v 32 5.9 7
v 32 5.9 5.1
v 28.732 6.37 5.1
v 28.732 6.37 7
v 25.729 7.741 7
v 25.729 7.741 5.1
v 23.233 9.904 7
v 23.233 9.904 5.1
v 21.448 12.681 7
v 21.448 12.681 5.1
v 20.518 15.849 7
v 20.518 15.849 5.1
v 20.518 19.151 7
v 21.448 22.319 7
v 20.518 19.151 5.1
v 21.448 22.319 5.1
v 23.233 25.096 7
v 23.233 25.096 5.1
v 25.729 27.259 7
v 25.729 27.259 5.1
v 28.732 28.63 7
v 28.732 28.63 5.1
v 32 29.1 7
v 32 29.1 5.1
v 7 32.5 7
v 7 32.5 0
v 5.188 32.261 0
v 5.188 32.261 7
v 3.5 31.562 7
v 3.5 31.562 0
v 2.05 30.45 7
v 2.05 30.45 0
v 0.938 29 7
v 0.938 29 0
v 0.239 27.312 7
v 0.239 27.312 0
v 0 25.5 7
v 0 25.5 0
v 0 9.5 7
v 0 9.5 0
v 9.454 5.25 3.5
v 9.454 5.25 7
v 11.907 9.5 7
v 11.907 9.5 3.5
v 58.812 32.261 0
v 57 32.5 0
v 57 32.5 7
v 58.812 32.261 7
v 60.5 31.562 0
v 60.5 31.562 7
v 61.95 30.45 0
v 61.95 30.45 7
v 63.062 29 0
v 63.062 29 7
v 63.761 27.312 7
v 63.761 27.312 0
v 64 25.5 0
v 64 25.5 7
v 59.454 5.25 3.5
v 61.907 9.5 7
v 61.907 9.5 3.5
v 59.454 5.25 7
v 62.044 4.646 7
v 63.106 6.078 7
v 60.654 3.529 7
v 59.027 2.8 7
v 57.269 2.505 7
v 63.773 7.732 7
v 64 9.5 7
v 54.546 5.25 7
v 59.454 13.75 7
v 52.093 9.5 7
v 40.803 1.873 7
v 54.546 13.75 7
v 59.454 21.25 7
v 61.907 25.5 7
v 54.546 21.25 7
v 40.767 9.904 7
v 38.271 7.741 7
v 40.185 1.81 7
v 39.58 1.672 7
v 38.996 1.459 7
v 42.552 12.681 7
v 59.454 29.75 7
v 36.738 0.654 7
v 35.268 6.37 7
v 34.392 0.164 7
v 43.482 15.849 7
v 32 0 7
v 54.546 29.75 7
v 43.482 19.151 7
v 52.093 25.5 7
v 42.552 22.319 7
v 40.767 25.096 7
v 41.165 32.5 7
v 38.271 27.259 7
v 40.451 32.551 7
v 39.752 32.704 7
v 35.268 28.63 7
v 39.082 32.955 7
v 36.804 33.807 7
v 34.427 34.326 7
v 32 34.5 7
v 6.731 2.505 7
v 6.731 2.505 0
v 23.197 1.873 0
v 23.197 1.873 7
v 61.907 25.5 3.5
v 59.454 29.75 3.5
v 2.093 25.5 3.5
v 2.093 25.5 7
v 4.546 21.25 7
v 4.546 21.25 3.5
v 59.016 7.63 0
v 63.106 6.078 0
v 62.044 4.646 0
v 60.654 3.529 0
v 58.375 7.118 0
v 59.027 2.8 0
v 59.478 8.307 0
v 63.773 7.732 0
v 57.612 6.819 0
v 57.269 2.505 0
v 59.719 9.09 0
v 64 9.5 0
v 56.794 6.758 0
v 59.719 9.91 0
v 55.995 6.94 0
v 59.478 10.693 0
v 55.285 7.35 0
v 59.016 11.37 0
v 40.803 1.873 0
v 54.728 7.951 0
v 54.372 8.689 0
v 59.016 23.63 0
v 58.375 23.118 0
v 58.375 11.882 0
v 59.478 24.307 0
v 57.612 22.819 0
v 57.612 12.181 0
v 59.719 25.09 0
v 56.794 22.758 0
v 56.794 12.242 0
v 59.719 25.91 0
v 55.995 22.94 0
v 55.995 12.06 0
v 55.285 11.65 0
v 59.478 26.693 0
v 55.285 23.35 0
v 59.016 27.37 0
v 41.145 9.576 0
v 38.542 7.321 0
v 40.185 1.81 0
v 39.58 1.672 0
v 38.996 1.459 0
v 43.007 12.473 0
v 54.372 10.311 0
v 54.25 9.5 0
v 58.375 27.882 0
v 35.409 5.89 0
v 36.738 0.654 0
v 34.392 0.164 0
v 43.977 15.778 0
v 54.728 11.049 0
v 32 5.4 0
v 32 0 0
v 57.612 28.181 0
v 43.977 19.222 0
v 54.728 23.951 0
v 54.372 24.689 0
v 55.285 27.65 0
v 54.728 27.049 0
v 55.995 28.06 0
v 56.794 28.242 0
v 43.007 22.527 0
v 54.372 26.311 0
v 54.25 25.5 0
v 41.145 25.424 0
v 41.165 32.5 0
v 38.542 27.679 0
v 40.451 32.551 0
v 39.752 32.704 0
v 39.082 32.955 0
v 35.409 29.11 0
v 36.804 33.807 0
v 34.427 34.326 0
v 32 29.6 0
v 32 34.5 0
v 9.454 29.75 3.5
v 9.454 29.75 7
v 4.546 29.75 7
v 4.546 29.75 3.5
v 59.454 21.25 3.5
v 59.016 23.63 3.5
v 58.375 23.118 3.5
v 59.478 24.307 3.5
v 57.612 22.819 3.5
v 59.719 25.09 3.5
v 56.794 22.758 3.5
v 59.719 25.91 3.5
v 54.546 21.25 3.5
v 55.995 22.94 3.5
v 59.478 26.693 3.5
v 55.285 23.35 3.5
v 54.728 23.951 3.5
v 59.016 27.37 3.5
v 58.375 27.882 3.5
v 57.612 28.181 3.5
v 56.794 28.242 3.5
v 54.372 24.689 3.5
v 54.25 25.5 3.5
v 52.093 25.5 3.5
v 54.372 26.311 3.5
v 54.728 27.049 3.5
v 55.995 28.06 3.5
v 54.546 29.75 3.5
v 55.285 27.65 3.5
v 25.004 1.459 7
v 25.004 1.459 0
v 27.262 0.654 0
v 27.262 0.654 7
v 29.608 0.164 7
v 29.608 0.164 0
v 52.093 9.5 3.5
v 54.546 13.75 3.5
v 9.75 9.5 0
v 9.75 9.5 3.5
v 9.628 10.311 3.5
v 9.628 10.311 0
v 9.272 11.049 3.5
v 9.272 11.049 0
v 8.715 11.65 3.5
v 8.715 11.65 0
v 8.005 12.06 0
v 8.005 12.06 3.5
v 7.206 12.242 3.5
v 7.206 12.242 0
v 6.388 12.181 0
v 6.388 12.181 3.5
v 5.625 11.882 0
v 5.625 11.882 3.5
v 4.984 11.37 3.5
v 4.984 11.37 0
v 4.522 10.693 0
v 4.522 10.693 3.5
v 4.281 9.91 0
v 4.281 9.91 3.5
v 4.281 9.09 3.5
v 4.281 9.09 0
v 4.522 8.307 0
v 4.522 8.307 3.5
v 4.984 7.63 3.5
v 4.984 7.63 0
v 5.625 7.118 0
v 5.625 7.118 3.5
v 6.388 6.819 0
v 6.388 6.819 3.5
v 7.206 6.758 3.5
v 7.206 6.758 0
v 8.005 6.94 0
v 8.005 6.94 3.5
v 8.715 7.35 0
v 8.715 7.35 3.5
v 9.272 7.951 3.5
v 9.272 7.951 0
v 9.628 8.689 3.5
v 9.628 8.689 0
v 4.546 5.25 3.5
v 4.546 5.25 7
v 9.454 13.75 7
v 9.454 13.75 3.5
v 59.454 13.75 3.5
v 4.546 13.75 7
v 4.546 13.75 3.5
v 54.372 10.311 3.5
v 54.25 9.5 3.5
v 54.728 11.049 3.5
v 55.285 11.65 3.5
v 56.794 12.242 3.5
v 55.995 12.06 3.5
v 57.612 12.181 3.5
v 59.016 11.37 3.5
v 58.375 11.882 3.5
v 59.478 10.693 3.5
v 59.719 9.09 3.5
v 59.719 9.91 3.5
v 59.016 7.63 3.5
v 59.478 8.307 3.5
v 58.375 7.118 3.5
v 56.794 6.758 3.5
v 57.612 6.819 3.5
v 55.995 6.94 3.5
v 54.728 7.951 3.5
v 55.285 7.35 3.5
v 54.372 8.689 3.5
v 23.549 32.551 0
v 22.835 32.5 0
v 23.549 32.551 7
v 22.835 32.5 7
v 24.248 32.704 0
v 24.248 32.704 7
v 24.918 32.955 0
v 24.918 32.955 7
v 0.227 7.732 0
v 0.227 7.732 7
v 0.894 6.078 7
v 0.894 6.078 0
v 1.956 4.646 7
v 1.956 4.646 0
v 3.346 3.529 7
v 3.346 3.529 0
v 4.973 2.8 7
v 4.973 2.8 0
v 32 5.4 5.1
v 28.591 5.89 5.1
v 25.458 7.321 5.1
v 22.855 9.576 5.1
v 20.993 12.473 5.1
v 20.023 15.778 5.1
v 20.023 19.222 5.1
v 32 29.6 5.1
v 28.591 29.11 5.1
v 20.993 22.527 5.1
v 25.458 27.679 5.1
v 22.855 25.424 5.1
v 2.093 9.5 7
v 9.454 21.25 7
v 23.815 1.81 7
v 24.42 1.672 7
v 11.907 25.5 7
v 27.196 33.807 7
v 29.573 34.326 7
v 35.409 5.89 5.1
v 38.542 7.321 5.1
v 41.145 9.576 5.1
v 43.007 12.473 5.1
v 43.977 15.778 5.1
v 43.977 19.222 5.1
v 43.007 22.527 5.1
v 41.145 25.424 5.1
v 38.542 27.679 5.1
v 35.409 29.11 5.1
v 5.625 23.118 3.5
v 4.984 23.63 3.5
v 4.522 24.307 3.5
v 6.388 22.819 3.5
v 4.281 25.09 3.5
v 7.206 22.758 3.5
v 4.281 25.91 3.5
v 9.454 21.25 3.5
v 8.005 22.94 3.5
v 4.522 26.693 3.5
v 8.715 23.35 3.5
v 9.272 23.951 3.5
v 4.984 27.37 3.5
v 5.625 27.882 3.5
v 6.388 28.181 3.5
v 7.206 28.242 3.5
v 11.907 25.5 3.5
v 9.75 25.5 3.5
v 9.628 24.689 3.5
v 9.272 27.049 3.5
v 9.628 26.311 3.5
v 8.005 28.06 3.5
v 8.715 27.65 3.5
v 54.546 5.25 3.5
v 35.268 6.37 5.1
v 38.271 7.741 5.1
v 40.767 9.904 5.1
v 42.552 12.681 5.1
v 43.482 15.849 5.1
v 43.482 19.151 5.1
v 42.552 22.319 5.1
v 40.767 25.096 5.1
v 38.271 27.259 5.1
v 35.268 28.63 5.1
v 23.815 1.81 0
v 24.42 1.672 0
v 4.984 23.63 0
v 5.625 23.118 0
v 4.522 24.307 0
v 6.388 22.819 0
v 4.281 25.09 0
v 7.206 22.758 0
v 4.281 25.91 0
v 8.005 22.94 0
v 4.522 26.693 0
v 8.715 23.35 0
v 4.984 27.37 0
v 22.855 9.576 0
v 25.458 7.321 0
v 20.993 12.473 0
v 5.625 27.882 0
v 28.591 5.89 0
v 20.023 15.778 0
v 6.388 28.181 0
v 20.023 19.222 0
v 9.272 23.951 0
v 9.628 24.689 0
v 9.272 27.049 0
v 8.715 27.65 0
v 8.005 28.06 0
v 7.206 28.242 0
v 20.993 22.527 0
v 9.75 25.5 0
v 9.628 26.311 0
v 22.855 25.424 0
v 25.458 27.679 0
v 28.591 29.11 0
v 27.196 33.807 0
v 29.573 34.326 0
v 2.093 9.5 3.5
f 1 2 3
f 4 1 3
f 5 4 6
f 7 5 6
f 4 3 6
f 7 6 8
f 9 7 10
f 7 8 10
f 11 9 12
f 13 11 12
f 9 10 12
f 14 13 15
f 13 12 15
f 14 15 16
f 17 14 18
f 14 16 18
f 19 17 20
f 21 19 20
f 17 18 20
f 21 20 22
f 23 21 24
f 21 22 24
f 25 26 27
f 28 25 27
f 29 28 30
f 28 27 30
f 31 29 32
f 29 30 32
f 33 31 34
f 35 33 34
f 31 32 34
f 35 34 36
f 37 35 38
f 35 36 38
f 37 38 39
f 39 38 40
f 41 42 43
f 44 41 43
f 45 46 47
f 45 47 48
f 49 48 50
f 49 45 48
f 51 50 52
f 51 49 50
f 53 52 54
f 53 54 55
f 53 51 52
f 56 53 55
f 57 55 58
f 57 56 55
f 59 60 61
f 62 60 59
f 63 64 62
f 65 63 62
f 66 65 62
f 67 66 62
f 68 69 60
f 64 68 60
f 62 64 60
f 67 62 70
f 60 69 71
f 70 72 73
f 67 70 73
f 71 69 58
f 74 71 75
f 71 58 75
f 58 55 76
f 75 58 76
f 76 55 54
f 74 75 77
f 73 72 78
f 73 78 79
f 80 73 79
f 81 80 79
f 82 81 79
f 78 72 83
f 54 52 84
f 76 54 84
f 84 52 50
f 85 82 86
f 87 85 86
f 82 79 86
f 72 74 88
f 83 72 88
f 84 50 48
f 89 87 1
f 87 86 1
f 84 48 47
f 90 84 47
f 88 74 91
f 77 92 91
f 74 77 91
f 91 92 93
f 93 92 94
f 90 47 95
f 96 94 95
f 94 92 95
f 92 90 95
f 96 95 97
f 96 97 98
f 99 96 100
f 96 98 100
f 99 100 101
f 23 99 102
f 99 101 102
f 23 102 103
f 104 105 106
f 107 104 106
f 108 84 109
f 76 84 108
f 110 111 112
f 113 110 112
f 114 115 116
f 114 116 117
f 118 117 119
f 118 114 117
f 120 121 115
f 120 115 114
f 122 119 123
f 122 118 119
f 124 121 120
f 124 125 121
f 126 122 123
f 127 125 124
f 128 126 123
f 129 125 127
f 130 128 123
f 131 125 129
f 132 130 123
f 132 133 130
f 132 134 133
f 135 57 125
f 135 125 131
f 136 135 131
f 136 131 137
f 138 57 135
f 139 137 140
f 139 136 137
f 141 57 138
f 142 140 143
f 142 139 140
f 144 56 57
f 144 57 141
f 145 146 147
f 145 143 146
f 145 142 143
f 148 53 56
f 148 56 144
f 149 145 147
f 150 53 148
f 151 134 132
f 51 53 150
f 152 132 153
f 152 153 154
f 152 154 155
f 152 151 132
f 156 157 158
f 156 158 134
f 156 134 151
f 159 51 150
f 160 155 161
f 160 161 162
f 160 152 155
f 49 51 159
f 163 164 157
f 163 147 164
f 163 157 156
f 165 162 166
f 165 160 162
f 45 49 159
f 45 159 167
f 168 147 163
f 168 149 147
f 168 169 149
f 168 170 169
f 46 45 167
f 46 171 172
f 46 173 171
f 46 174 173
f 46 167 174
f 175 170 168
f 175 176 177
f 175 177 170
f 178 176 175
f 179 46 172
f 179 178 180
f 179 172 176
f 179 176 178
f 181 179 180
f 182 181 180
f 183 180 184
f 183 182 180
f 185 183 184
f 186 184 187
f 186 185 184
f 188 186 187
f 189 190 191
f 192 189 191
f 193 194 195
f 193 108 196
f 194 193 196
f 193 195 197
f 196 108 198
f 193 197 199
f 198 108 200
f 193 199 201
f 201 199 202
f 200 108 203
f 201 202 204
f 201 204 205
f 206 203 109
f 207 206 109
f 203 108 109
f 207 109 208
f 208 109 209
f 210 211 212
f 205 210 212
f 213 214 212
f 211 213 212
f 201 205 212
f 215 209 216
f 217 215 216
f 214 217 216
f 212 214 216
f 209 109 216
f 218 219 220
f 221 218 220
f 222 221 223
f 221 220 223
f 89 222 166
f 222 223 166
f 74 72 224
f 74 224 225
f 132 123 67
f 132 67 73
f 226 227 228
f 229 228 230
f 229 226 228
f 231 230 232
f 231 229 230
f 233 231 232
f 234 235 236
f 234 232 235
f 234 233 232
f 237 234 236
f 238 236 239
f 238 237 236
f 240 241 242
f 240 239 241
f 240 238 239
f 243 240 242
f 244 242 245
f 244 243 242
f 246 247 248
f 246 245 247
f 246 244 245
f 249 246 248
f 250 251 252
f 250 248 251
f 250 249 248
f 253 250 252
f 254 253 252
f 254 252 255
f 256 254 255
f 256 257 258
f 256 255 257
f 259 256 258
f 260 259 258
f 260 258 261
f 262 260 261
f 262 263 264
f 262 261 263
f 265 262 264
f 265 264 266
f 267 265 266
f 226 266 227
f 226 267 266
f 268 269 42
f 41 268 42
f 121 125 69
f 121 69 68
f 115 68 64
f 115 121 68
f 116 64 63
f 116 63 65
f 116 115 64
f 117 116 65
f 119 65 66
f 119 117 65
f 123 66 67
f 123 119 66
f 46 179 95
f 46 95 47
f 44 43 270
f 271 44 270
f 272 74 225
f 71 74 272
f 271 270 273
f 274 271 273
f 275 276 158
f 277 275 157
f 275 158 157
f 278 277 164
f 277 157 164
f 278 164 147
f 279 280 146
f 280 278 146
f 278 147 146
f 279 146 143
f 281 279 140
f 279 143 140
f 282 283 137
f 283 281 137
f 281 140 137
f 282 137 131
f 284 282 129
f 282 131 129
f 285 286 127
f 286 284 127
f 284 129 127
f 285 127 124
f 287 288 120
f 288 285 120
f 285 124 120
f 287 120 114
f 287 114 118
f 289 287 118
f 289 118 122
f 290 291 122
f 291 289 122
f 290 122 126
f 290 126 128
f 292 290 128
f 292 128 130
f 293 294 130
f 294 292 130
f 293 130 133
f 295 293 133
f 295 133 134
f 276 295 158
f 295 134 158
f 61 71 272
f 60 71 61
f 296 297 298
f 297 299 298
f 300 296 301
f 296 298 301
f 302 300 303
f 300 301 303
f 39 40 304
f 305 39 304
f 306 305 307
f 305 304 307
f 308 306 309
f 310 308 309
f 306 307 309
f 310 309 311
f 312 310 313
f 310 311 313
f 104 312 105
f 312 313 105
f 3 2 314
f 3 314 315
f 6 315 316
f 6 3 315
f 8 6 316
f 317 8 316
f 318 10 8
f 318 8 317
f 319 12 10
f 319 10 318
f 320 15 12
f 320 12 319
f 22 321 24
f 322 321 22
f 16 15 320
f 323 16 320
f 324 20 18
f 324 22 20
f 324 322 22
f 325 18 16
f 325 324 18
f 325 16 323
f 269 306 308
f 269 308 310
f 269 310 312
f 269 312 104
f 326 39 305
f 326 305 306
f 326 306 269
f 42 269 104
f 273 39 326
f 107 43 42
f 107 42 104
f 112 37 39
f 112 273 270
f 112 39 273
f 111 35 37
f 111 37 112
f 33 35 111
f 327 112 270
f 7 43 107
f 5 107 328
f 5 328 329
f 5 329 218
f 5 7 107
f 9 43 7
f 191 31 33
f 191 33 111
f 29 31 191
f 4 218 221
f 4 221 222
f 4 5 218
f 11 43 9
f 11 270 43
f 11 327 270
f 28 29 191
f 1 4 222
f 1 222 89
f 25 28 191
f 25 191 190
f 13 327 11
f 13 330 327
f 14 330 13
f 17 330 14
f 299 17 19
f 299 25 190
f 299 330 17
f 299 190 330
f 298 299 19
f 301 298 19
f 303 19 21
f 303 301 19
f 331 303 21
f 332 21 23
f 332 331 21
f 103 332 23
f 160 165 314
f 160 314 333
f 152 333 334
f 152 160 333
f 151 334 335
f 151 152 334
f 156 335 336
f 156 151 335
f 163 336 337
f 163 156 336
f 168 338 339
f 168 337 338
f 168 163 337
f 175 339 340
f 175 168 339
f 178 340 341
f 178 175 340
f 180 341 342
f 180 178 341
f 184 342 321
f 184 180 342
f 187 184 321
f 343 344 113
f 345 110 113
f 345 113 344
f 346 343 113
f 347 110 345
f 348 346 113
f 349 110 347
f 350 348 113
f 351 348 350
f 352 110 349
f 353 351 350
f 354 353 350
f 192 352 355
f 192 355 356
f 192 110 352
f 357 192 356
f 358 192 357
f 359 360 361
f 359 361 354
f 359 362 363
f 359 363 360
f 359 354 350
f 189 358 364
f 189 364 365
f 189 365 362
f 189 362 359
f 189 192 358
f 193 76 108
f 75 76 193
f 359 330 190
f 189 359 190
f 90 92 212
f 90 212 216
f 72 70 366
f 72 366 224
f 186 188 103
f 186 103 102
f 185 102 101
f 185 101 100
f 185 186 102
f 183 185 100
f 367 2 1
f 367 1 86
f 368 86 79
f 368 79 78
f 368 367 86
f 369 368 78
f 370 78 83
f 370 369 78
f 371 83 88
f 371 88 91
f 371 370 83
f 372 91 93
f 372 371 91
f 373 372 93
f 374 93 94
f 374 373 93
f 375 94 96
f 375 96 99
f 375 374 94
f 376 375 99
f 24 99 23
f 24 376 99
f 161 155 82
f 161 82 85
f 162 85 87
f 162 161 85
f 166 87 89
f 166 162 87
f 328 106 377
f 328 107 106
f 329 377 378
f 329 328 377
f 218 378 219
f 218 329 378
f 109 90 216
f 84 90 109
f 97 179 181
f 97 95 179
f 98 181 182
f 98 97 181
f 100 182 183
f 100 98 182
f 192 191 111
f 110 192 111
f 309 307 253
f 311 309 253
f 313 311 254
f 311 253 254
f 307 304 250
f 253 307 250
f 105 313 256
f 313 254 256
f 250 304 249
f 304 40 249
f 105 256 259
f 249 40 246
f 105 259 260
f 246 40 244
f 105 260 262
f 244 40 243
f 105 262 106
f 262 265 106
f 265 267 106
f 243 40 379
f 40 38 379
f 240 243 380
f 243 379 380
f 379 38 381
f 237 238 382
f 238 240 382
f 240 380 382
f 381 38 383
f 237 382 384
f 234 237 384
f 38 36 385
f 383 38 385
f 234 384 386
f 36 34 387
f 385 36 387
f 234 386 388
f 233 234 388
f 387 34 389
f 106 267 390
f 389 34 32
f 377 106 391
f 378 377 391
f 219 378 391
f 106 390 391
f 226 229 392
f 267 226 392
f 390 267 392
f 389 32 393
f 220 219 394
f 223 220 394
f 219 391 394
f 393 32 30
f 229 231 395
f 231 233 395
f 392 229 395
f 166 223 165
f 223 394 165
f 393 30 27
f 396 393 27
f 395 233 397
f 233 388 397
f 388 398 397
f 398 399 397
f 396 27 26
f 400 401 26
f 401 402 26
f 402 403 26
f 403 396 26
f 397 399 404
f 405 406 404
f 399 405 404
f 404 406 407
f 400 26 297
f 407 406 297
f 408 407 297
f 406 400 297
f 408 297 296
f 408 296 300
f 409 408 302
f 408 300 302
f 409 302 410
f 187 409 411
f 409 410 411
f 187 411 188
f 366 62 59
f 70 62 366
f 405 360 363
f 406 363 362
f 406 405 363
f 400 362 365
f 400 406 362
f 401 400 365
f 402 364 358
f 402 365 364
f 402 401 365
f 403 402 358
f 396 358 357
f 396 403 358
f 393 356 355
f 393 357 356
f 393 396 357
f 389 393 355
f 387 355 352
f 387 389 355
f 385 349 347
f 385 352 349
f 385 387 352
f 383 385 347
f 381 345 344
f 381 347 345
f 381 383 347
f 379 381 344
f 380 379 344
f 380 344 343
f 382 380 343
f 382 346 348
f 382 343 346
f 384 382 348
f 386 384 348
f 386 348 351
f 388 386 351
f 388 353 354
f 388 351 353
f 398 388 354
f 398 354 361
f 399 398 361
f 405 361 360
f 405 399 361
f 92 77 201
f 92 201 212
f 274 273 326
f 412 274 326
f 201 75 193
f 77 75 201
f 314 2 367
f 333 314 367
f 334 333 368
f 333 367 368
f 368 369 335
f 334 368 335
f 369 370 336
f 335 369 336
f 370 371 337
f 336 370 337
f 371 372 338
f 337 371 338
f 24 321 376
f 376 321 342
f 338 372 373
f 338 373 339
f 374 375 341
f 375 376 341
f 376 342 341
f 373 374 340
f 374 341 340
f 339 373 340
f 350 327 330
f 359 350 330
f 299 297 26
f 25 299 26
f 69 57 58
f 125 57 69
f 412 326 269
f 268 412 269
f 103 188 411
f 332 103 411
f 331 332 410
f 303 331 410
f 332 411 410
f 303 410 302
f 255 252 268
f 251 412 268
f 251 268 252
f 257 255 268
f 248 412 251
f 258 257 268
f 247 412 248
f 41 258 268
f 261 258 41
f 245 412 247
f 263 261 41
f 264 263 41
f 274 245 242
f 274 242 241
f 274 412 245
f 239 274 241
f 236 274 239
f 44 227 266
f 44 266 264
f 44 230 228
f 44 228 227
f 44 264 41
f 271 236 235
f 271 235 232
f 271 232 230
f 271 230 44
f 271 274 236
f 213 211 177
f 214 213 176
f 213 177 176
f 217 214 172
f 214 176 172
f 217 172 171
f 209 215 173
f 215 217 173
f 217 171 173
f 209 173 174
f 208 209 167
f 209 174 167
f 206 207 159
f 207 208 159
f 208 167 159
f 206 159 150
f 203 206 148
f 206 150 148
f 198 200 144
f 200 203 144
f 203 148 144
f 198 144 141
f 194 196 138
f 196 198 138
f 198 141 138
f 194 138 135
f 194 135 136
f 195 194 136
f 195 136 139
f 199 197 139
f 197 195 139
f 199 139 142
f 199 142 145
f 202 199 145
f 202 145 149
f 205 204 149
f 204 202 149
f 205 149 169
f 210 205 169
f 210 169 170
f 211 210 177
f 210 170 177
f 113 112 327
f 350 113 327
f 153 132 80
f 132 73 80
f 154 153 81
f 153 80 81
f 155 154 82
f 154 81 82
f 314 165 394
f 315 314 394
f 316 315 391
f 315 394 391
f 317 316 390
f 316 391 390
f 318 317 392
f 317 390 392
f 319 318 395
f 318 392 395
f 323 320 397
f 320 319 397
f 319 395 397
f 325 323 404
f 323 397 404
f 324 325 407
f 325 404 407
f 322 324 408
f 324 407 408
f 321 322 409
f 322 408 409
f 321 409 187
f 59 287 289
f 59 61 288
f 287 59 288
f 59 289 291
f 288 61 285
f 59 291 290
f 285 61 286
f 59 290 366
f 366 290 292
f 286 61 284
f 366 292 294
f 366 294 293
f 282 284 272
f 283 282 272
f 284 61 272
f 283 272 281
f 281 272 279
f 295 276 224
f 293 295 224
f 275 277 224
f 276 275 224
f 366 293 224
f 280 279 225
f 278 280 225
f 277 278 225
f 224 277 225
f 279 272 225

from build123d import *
from build123d.topology import SkipClean

# Parameters (mm, degrees)
SKETCH1_R           = 2.75
BOSS_EXTRUDE1_DEPTH = 7
SKETCH2_R           = 12.1
CUT_EXTRUDE1_DEPTH  = 5.1
CUT_EXTRUDE2_DEPTH  = 3.5
FILLET1_R           = 5


with BuildPart() as part:
    # Sketch1 → Boss-Extrude1 (new body)
    with BuildSketch(Plane.XY):
        with BuildLine():
            Line((24.00000152, 32.500000075), (7.00000152, 32.500000075))
            ThreePointArc((7.00000152, 32.500000075), (2.050254052, 30.449747543), (1.52e-06, 25.500000075))
            Line((1.52e-06, 25.500000075), (1.52e-06, 9.500000075))
            ThreePointArc((1.52e-06, 9.500000075), (1.956143738, 4.646187277), (6.731286856, 2.50515966))
            Line((6.731286856, 2.50515966), (24.20077069, 1.834049785))
            ThreePointArc((24.20077069, 1.834049785), (27.99401413, 0.464681908), (32.00000152, 7.5e-08))
            Line((32.00000152, 7.5e-08), (32.00000152, 5.900000075))
            ThreePointArc((32.00000152, 5.900000075), (20.40000152, 17.500000075), (32.00000152, 29.100000075))
            Line((32.00000152, 29.100000075), (32.00000152, 34.500000075))
            ThreePointArc((32.00000152, 34.500000075), (27.876895894, 33.992422577), (24.00000152, 32.500000075))
        make_face()
        with Locations((7.00000152, 25.500000075)):
            Circle(SKETCH1_R, mode=Mode.SUBTRACT)
        with Locations((7.00000152, 9.500000075)):
            Circle(SKETCH1_R, mode=Mode.SUBTRACT)
    extrude(amount=BOSS_EXTRUDE1_DEPTH)

    # Sketch2 → Cut-Extrude1 (cut)
    with BuildSketch(Plane(origin=(0, 0, 0), x_dir=(-1, 0, 0), z_dir=(0, 0, -1))):
        with Locations((-32.00000152, 17.500000075)):
            Circle(SKETCH2_R)
    extrude(amount=-CUT_EXTRUDE1_DEPTH, mode=Mode.SUBTRACT)

    # Sketch3 → Cut-Extrude2 (cut)
    with BuildSketch(Plane.XY.offset(7)):
        Polygon((4.546262876, 29.750000075), (2.092524232, 25.500000075), (4.546262876, 21.250000075), (9.453740164, 21.250000075), (11.907478808, 25.500000075), (9.453740164, 29.750000075), align=None)
        Polygon((4.546262876, 13.750000075), (2.092524232, 9.500000075), (4.546262876, 5.250000075), (9.453740164, 5.250000075), (11.907478808, 9.500000075), (9.453740164, 13.750000075), align=None)
    extrude(amount=-CUT_EXTRUDE2_DEPTH, mode=Mode.SUBTRACT)

    # Fillet1
    fillet1_edges = [part.edges().sort_by_distance(p)[0] for p in [
        (24.00000152, 32.500000075, 3.5),
        (24.20077069, 1.834049785, 3.5),
    ]]
    fillet(fillet1_edges, radius=FILLET1_R)

    # Mirror1: part across plane


with BuildPart() as part_1:
    with SkipClean():  # the faces are left unmerged after this step: merging them gives an invalid solid
        add(part.part)
        add(part.part.mirror(Plane(origin=(32.00000152, 34.500000075, 7), x_dir=(0, 0, 1), z_dir=(-1, 0, 0))))


solid = part_1.part
